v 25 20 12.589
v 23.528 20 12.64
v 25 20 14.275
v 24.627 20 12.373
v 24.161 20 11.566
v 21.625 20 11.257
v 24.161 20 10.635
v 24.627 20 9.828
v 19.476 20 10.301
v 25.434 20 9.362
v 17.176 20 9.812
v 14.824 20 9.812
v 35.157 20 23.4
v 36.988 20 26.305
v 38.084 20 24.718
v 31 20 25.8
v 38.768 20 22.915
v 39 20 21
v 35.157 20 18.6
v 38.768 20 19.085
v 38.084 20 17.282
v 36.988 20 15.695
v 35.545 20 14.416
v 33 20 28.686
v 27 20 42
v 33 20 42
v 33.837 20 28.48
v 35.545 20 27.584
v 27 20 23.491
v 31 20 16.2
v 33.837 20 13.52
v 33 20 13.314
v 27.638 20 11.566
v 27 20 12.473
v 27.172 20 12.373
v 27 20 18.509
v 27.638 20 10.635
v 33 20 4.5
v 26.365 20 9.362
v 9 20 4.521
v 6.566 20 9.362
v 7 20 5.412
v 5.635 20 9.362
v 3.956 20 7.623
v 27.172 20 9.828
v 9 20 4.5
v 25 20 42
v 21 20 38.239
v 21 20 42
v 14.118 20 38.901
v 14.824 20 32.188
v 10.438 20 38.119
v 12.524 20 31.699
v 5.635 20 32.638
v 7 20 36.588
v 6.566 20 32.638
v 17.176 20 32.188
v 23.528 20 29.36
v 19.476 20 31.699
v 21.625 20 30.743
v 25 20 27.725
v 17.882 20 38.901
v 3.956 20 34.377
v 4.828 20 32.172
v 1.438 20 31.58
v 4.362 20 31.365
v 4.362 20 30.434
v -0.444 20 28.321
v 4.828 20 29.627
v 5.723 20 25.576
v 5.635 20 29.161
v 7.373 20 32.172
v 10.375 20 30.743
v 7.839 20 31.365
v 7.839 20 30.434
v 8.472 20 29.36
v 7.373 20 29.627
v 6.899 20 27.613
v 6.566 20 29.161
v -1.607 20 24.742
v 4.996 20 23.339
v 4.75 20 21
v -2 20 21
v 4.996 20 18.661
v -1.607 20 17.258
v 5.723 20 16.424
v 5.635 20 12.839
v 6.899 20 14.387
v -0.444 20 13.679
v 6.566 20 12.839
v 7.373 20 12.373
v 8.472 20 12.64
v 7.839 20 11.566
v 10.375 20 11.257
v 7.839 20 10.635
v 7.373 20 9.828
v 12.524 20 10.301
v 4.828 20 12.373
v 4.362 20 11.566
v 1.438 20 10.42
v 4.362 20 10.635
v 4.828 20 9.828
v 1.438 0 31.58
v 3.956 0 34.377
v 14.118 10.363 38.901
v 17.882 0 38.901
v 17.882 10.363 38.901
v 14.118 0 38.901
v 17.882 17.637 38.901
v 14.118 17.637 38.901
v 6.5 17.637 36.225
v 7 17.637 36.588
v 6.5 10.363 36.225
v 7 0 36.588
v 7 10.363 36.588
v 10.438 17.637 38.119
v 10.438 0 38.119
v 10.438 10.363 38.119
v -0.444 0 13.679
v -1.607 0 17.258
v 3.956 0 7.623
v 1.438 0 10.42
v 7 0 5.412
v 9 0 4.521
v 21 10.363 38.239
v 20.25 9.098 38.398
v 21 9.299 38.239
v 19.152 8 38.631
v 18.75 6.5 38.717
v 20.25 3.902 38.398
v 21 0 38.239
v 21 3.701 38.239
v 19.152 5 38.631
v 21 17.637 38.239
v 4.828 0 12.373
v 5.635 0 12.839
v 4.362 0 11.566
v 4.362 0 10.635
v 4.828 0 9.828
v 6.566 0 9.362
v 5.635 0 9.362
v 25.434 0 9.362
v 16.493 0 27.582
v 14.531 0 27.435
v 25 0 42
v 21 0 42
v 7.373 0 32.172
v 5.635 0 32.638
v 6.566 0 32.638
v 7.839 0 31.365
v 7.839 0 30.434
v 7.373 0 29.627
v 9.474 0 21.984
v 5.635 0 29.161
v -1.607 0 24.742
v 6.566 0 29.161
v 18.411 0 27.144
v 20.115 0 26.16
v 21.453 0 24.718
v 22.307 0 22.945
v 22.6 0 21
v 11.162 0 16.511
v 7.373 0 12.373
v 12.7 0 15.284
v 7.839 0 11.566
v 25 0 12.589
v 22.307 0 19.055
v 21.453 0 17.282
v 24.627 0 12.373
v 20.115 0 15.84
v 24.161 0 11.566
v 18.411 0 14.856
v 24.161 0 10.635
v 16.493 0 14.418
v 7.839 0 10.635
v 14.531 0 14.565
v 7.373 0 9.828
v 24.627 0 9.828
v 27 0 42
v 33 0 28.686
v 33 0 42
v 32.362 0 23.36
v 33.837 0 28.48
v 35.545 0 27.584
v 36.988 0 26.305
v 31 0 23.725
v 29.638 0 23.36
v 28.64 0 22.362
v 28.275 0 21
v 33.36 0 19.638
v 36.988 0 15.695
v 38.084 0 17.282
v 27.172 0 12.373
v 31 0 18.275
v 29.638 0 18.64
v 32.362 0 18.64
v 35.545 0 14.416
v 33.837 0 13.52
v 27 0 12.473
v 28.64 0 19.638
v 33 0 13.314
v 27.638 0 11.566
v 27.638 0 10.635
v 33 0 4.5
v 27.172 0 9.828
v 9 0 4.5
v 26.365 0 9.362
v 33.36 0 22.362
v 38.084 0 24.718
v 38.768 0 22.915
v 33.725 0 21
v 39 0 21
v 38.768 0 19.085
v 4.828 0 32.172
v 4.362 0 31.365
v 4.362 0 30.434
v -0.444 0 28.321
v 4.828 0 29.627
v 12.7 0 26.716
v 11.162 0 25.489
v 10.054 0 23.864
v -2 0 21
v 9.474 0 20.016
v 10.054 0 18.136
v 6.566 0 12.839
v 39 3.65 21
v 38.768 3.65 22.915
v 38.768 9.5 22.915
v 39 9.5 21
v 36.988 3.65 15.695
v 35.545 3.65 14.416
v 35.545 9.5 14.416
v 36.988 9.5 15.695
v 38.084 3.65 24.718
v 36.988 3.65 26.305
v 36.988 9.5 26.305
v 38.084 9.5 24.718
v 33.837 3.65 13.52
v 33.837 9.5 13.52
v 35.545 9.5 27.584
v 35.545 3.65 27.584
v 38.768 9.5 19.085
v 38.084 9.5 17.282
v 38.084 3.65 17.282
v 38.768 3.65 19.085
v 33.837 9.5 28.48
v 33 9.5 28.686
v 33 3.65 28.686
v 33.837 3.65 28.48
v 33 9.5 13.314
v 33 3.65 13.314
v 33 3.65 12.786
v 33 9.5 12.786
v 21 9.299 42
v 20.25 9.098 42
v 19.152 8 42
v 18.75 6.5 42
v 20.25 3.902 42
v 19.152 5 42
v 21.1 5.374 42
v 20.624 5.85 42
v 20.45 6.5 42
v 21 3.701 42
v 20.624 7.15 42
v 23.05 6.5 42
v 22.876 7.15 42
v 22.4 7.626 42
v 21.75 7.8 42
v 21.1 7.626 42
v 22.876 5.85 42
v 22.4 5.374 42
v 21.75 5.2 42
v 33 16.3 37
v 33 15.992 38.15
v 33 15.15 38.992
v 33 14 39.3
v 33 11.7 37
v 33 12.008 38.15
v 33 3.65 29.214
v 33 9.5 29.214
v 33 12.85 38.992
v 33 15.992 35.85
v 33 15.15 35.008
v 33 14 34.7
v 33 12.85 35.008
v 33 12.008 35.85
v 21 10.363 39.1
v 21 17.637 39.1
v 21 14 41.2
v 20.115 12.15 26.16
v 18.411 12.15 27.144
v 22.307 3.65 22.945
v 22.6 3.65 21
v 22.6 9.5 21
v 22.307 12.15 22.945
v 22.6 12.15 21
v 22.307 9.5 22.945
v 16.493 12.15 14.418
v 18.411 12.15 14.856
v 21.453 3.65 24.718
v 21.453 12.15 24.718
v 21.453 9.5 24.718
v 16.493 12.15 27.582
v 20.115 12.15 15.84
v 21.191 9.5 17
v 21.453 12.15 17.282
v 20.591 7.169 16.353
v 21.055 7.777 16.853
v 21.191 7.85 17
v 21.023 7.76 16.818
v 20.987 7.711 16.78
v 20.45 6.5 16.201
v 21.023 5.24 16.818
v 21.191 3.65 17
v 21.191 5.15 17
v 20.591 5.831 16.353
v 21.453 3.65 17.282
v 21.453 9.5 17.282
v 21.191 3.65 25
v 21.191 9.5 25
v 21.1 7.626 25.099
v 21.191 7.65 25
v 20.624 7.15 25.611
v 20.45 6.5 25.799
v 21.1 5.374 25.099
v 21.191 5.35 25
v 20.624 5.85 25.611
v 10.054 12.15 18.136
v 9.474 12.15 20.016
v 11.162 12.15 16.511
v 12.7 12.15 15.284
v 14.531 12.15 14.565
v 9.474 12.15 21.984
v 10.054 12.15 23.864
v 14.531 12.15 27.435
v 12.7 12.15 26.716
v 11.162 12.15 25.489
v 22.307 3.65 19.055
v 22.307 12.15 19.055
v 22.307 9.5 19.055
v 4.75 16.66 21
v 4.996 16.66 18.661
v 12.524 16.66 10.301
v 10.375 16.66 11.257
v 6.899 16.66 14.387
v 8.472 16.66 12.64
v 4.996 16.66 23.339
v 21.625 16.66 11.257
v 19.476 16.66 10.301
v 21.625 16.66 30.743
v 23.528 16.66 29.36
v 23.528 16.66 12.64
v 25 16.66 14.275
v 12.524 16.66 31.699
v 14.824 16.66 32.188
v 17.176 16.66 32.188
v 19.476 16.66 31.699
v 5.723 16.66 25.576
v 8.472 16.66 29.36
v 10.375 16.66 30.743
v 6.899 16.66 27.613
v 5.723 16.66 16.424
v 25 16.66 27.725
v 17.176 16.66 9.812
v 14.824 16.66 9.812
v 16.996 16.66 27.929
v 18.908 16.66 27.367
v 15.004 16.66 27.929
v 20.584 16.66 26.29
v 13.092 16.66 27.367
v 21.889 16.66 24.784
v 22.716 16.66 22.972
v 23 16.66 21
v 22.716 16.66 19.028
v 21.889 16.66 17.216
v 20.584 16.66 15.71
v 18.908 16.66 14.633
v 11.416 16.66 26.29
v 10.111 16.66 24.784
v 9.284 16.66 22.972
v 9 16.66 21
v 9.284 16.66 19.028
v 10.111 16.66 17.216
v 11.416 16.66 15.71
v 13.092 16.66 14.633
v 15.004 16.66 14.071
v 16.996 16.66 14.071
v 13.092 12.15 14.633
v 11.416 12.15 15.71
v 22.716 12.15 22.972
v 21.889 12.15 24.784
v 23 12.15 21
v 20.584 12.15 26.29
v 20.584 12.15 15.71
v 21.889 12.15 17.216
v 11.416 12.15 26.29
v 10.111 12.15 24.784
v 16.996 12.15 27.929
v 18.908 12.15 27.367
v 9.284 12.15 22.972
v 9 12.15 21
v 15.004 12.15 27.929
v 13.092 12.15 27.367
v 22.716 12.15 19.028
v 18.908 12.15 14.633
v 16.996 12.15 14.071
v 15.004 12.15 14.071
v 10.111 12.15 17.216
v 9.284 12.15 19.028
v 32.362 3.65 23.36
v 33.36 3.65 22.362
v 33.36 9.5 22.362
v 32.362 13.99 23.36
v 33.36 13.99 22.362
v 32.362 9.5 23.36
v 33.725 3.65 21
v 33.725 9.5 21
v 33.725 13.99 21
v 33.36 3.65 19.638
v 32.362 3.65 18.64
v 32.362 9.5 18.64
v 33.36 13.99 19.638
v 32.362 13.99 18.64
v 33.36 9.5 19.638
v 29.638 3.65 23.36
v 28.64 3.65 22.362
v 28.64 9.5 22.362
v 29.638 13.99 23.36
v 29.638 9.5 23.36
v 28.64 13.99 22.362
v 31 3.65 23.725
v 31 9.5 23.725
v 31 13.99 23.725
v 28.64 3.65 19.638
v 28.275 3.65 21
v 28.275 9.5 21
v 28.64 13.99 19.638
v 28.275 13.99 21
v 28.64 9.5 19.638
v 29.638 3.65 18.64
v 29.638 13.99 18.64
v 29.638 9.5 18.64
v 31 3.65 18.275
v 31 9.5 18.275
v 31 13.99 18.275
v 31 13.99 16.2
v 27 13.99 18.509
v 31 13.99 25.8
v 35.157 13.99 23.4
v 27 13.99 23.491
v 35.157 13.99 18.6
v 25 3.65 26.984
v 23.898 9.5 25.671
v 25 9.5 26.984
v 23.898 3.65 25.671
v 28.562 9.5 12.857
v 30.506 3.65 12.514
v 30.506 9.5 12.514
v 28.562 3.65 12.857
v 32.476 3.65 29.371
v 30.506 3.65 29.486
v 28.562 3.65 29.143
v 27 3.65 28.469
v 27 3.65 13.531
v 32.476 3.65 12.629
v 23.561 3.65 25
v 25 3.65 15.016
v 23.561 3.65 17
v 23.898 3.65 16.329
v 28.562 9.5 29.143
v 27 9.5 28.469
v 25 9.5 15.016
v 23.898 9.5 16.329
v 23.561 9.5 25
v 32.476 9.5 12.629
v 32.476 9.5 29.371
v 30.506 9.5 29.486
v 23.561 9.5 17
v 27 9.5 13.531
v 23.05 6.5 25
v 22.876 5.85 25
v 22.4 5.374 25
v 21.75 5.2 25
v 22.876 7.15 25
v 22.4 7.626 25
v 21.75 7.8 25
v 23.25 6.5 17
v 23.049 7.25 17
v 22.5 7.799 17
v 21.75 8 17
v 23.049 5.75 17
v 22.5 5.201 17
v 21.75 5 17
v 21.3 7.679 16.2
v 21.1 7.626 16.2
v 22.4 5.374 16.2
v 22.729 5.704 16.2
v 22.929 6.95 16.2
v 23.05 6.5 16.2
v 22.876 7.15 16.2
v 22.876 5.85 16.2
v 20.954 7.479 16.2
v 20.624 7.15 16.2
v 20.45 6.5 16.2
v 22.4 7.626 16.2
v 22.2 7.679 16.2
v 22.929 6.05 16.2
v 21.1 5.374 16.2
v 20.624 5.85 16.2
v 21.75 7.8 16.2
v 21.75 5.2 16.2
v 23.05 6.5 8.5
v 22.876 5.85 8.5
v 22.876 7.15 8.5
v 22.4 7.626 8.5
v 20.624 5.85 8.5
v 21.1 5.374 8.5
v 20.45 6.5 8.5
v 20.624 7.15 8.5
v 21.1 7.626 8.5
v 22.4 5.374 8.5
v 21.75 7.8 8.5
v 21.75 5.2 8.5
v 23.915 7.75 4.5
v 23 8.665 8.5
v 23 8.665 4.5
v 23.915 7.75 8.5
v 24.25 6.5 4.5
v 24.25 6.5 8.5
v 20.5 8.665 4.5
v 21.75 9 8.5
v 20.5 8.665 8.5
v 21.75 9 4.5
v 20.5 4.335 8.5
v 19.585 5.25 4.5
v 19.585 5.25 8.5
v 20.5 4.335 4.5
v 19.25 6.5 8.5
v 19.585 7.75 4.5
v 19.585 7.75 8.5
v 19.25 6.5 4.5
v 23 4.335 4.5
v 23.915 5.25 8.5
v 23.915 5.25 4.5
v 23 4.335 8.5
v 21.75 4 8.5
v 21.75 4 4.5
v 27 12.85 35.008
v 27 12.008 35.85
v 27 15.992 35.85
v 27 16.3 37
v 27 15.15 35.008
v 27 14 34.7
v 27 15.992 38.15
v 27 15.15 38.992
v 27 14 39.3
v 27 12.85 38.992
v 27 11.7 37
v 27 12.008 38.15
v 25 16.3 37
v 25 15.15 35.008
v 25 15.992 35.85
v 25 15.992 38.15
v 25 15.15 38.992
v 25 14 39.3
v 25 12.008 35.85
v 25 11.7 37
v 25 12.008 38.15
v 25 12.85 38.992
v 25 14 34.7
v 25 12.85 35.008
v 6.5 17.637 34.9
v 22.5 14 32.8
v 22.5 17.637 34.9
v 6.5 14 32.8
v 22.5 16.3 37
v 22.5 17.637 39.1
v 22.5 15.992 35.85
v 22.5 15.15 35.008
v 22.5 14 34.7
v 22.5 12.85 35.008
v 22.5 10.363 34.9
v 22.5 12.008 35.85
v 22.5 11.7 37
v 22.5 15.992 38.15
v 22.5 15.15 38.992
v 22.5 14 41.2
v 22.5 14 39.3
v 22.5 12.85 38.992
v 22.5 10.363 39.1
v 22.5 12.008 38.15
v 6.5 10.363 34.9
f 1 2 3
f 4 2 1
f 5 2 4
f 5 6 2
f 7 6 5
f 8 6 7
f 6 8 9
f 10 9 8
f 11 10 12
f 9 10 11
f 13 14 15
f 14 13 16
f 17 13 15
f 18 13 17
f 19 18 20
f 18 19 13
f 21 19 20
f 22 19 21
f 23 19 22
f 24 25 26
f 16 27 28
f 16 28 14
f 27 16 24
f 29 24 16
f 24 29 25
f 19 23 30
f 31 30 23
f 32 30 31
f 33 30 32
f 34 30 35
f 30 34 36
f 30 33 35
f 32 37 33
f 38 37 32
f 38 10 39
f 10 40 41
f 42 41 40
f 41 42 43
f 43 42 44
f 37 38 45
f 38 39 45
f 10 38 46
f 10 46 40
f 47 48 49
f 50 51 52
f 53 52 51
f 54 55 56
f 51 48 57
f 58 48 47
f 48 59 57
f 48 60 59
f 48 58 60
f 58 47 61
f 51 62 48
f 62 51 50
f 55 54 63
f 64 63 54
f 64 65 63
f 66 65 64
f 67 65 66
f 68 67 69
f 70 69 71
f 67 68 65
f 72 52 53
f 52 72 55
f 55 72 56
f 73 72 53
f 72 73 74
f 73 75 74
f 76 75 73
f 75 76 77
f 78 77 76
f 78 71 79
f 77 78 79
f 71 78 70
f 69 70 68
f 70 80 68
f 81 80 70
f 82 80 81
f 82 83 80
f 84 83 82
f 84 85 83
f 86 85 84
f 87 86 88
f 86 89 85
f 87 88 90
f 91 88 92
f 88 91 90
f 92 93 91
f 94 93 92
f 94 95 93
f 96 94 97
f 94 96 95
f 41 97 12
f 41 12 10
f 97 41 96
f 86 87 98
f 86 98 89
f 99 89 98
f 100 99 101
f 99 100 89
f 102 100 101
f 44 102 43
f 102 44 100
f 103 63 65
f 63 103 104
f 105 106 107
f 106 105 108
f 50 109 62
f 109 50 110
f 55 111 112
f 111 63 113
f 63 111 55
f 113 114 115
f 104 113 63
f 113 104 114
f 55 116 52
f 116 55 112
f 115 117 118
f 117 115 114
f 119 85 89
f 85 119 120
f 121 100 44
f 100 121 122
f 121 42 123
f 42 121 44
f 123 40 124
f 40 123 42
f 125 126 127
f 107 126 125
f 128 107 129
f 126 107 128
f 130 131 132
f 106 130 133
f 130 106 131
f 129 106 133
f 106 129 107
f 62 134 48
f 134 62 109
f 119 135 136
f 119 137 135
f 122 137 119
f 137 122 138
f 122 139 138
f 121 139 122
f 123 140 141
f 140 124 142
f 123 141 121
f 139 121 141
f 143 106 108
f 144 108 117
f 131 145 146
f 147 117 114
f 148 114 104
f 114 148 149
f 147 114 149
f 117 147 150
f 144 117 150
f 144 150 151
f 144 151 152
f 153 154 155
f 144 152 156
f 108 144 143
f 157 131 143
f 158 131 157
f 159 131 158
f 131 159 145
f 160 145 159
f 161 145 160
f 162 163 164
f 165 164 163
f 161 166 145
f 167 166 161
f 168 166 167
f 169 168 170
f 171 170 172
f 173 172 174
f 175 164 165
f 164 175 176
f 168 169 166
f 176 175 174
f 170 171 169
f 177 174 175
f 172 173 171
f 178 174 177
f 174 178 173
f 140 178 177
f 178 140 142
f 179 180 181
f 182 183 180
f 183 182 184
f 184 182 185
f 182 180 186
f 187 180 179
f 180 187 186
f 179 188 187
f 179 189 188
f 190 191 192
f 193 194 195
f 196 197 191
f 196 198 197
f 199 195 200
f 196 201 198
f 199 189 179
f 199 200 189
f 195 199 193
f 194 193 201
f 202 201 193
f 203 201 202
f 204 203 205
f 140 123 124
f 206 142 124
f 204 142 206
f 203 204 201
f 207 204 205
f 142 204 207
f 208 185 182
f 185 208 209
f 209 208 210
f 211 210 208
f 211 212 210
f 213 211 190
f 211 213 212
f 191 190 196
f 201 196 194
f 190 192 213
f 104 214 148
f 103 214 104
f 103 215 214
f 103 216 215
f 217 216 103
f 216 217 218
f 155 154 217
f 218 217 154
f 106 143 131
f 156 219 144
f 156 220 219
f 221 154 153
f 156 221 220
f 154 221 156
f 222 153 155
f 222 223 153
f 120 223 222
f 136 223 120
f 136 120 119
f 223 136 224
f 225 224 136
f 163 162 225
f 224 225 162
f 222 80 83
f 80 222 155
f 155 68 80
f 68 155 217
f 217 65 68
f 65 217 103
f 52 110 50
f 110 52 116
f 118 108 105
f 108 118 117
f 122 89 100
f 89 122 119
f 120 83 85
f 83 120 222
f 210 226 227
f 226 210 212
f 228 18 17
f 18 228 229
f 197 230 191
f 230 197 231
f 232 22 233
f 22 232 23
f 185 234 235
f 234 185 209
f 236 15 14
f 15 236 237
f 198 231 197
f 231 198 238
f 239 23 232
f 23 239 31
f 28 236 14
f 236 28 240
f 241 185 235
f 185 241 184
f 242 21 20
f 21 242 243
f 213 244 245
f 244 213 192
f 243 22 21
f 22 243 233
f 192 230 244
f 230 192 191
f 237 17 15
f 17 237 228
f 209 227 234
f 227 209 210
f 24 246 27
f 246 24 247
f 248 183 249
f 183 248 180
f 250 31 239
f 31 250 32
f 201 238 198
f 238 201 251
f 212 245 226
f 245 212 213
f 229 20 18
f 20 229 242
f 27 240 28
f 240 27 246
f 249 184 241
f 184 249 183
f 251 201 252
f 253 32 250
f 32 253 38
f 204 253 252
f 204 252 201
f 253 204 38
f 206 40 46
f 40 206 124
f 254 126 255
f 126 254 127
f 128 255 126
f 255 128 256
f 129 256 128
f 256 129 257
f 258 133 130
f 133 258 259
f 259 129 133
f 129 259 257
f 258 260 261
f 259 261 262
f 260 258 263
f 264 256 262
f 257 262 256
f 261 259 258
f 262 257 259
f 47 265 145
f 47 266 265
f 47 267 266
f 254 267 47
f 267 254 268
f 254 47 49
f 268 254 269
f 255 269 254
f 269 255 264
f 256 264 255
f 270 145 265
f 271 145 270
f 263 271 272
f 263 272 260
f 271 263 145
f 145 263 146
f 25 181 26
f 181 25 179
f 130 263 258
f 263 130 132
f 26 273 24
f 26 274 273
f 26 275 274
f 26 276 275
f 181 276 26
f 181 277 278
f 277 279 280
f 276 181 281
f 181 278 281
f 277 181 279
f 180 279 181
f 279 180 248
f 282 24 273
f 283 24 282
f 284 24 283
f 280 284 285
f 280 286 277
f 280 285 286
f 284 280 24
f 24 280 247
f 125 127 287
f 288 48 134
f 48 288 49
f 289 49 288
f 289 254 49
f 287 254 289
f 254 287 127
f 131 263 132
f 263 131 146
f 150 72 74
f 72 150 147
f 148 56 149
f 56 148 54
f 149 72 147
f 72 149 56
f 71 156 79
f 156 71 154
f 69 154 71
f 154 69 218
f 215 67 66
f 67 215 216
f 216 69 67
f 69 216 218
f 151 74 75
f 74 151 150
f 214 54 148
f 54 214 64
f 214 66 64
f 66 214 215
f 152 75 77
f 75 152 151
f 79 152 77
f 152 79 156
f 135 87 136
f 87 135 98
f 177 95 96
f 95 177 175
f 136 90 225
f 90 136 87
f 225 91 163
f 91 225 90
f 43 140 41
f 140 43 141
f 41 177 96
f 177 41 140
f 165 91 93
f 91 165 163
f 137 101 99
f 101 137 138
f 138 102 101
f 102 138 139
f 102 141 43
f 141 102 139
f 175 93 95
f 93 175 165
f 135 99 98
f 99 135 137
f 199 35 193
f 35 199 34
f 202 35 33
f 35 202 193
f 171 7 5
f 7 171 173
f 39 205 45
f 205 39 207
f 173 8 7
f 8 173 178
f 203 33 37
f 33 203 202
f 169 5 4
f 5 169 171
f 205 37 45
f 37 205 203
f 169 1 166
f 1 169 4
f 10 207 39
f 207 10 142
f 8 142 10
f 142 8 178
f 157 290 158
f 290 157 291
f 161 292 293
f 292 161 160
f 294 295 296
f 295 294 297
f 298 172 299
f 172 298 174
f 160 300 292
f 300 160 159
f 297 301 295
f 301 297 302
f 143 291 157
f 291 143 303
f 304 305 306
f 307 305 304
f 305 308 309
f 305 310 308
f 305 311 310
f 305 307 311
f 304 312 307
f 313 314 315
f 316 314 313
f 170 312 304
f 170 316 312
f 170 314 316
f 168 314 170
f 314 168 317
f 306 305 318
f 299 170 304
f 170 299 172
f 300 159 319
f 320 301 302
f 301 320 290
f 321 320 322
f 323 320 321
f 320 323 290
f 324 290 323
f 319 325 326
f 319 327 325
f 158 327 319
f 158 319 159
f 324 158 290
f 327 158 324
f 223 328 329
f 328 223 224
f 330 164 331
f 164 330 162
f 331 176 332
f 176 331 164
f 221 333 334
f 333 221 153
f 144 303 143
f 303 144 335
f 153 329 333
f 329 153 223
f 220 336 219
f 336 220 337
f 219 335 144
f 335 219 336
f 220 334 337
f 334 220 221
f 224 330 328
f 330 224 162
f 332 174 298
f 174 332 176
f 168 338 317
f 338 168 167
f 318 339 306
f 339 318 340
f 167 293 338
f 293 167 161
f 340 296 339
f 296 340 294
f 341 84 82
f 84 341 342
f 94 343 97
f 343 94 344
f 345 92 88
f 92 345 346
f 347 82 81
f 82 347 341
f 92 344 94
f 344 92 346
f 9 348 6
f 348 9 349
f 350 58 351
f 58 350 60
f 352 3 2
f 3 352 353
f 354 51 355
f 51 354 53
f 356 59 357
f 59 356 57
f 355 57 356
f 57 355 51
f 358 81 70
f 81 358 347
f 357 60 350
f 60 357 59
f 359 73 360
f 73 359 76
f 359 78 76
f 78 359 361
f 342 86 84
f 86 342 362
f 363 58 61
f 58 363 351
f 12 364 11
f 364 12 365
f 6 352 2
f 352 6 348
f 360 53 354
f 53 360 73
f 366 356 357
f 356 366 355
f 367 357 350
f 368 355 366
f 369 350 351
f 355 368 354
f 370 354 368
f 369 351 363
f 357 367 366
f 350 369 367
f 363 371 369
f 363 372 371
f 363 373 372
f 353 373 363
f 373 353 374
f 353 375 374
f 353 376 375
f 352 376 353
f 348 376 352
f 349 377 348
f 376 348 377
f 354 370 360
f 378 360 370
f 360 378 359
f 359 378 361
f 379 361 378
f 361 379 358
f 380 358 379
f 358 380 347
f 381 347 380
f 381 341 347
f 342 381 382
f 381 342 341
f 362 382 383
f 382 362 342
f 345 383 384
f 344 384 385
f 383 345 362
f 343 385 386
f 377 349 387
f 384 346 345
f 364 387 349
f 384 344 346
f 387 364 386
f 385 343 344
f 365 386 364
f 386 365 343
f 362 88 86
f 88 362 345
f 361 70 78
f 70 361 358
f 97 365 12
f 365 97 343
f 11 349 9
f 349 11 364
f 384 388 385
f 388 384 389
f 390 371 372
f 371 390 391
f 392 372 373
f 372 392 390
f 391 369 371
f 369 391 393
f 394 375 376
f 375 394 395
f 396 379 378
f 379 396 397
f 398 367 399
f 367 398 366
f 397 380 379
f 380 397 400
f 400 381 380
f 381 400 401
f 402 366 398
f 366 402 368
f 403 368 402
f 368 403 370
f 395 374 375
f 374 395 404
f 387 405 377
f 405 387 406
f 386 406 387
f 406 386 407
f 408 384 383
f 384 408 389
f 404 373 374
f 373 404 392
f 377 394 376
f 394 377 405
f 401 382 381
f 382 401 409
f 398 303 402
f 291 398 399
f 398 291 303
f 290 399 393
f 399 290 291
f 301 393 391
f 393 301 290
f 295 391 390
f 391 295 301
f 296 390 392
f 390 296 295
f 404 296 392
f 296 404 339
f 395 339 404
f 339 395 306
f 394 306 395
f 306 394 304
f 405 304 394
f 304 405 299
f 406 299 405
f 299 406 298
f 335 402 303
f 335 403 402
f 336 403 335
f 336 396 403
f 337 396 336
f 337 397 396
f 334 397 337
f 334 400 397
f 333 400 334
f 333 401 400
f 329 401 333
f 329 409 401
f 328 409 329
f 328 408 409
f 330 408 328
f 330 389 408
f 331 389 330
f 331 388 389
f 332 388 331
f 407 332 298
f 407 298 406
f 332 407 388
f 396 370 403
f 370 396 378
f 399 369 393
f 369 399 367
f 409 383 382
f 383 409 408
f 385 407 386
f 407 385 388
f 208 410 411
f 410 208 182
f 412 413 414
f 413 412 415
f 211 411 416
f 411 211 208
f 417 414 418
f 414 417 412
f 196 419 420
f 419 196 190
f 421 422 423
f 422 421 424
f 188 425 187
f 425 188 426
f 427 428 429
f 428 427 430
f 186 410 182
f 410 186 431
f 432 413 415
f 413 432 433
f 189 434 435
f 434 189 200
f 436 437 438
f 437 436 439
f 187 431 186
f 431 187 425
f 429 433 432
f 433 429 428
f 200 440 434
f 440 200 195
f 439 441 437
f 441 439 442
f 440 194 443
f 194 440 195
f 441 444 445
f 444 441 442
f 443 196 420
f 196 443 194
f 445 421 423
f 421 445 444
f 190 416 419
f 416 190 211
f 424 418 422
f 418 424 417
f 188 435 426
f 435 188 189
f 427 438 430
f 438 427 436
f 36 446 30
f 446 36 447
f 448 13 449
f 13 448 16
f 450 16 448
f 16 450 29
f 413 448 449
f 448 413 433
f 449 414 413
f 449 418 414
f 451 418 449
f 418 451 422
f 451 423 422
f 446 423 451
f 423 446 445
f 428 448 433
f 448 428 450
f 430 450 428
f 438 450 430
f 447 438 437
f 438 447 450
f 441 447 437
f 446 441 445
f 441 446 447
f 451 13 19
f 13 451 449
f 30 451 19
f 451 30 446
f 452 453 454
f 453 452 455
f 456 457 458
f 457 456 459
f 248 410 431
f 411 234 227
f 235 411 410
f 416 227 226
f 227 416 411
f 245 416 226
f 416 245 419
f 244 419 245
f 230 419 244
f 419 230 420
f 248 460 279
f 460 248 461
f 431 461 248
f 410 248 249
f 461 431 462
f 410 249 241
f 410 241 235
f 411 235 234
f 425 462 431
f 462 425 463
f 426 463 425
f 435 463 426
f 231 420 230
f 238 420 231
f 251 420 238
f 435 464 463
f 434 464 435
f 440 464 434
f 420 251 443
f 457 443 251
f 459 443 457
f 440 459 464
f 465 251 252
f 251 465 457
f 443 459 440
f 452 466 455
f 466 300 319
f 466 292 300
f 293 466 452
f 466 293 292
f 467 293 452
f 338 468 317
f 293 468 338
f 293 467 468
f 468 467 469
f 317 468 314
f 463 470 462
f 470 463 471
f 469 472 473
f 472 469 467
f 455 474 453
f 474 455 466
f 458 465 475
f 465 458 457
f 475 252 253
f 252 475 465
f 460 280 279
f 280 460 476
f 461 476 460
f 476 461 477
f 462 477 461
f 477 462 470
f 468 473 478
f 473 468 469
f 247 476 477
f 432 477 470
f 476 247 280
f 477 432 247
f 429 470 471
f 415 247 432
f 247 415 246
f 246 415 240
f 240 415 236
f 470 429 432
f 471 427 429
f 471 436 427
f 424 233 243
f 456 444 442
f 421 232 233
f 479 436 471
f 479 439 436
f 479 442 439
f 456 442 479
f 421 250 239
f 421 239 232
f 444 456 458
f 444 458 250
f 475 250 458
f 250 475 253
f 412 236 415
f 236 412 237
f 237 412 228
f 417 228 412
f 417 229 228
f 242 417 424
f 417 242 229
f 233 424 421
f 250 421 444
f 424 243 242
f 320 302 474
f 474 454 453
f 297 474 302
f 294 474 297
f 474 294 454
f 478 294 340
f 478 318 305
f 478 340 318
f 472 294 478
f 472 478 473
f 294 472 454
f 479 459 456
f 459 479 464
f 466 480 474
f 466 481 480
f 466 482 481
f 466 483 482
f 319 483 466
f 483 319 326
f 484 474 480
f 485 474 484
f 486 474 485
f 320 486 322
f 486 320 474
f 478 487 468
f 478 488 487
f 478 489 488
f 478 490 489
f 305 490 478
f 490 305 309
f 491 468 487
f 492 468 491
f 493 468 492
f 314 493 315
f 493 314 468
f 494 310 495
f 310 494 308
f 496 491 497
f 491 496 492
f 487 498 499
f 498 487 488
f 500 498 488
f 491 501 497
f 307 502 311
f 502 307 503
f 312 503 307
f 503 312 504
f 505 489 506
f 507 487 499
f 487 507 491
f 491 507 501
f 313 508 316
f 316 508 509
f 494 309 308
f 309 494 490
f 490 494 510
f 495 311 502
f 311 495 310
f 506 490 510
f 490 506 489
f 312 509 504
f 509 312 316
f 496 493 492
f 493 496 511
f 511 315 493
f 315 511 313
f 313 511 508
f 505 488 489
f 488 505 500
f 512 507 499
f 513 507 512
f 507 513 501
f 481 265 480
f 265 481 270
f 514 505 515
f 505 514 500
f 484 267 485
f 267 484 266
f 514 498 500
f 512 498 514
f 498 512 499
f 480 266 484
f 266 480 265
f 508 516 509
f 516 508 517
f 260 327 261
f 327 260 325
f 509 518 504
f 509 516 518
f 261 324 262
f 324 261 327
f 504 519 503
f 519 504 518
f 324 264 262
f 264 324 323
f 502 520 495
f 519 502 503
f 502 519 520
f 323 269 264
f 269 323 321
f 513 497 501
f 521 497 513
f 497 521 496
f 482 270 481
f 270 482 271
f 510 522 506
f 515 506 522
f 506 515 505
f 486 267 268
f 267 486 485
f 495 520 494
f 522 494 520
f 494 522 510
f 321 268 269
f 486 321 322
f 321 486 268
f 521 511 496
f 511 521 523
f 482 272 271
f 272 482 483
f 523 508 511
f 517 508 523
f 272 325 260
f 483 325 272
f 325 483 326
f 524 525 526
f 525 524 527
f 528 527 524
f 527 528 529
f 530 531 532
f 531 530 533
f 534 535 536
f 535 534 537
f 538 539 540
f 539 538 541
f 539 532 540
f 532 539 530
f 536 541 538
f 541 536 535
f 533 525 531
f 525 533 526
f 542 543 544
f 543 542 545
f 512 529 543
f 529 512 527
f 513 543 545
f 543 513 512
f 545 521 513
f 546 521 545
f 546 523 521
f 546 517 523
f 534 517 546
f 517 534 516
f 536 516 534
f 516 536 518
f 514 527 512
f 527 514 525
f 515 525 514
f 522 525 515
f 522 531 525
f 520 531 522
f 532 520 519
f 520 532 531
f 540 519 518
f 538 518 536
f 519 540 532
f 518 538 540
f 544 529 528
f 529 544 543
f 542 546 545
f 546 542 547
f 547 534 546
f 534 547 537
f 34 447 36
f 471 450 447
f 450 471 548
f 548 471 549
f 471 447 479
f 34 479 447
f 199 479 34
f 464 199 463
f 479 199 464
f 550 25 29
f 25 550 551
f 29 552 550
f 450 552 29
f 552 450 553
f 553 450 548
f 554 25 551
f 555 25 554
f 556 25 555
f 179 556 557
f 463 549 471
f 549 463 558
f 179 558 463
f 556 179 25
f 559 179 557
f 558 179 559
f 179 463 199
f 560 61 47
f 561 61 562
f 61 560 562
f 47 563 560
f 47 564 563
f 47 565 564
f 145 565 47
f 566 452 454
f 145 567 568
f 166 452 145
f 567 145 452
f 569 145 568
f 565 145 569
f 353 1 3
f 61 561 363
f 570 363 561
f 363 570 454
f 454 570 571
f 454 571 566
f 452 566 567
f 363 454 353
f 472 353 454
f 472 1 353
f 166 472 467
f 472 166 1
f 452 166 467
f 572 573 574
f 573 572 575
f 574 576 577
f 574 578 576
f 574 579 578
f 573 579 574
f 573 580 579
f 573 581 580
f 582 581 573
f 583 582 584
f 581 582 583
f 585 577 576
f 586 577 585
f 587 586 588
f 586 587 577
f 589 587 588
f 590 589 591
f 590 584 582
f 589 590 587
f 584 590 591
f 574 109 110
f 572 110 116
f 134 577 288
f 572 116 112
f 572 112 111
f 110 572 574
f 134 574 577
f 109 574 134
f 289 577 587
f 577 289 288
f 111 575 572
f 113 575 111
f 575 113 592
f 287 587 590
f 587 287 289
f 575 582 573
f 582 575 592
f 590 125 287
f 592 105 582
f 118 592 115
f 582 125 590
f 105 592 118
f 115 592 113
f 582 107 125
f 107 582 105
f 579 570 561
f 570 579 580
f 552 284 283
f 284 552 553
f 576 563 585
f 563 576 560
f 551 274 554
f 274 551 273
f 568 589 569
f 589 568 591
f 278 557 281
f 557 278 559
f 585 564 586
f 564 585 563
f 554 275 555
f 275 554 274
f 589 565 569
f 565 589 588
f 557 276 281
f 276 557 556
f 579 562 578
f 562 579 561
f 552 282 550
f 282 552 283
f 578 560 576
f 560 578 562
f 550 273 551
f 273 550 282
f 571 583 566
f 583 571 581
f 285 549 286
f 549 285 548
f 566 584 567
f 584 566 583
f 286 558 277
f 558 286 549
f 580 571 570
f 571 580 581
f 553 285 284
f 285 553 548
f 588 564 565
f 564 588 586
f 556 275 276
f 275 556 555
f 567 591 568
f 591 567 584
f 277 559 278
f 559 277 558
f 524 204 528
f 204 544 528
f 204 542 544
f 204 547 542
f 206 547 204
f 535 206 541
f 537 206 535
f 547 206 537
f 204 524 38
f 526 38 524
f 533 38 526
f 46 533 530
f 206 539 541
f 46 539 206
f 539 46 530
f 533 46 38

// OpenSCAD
first_layer = 0.3;

difference() {
	
	union() {
		//main cylinder
		translate([16,20,21]) rotate([90,0,0]) cylinder(h=20, r=18);//cube([44, 20, 42]);
		
		//bearing mount
		translate([31,20,21]) rotate([90,0,0]) cylinder (h=20, r=8);
		
		//V3 Mount
		translate([9,0,-7]) cube([24, 20, 22]);
		translate([21,first_layer/2,-11]) rotate([90,0,0]) cube([24, 22, first_layer], center=true);
		//translate([27,first_layer/2,45]) rotate([90,0,0]) cube([12, 22, first_layer], center=true);
		
		//filament support
		translate([21.75,6.5,34]) rotate([0,0,0]) cylinder (h=8, r=3, $fn=12);
		
		//groovemount supports
//		translate([33,6.5,-7]) rotate([0,0,0]) cylinder (h=16, r=5, $fn=12);
//		translate([9,6.5,-7]) rotate([0,0,0]) cylinder (h=16, r=5, $fn=12);
		
		//clamp
		translate([21,0,28]) cube([12, 20, 14]);
	}
	
	//pulley opening
	translate([16,21,21]) rotate([90,0,0]){
		cylinder (h=22, r=6.6);
		
		rotate([0,0,45]) {
		//translate([14,0,0]) cylinder(h=22, r=1.6, $fn=12);
		translate([0,14,0]) cylinder(h=22, r=1.8, $fn=12);
		translate([-14,0,0]) cylinder(h=22, r=1.8, $fn=12);
		translate([0,-14,0]) cylinder(h=22, r=1.8, $fn=12);
		}
	}
	
	//gearhead indentation
	translate([16,20.01,21]) rotate([90,0,0]) cylinder (h=3.35, r=11.25);

	//pulley hub indentation
	translate([16,20-2,21]) rotate([90,0,0]) cylinder (h=5.85, r=7);
	
	//bearing screws
	translate([31,21,21]) rotate([90,0,0]) cylinder (h=22, r=2.725, $fn=12); //precision m5

	//translate([31,21,21]) rotate([90,0,0]) cylinder (h=22, r=2.6, $fn=12); //regular M5 screw
	//translate([31,22,21]) rotate([90,30,0]) cylinder (h=8.01, r=8.1/2, $fn=6); //M4
	translate([31,22,21]) rotate([90,30,0]) cylinder (h=8.01, r=4.8, $fn=6); //M5
	
	//bearing
	translate([31,9.5,21]) rotate([90,0,0]) cylinder (h=5.85, r=8.5);
	//translate([25,9.5-5.25,21-8.25-2]) cube([20, 5.85, 18.5]);
	
	//opening between bearing and pulley
	translate([20,9.5-5.85,21-8.25+3.25+1]) cube([10, 5.85, 8]);

	//filament path chamfer
	translate([21.75,6.5,15]) rotate([0,0,0]) cylinder (h=2, r1=1, r2=1.5, $fn=12);		

	translate([31,9.5,21]) rotate([90,0,0]) cylinder (h=5.85, r=8.5);

	
	//filament path
	translate([21.75,6.5,-10]) rotate([0,0,0]) cylinder (h=60, r=1.3, $fn=12); 
	translate([21.75,6.5,-51.5]) rotate([0,0,0]) cylinder (h=60, r=2.5, $fn=12); 
	
	//V3 Mount
//	translate([21.75,6.5,-2]) rotate([0,0,0]) cylinder (h=5, r=8.25);
	translate([21.75,6.5,-7]) rotate([0,0,0]) cylinder (h=8, r=4.5);
//	translate([21.75-8,6.5-8,-2]) cube([16, 8, 5]);
//	translate([21.75-6,6.5-7,-7]) cube([12, 7, 5]);
	translate([21.75,6.5,3.5]) rotate([90,0,0]) cylinder (h=10, r=1,  $fn=12);
	
	//groovemount supports
//	translate([33,6.5,-8]) rotate([0,0,0]) cylinder (h=20, r=1.6, $fn=12);
//	translate([33,6.5,7]) rotate([0,0,0]) cylinder (h=3, r=3.5, $fn=6);

//	translate([9,6.5,-8]) rotate([0,0,0]) cylinder (h=20, r=1.6, $fn=12);
//	translate([9,6.5,7]) rotate([0,0,0]) cylinder (h=3, r=3.5, $fn=6);
//	translate([3,3,7]) cube([8, 7, 3]);
	
	//clamp slit
	translate([25,-1,10]) cube([2, 22, 35]);
	//clamp nut
	translate([6.5,14,37]) rotate([0,90,0]) cylinder (h=16, r=4.2, $fn=6);
	//clamp screw hole
	translate([15,14,37]) rotate([0,90,0]) cylinder (h=20, r=2.3, $fn=12);
	
	translate([9,-2,-25.5])cube(30,20,10);
    translate([9,-2,43.5])cube(30,20,10);
}
